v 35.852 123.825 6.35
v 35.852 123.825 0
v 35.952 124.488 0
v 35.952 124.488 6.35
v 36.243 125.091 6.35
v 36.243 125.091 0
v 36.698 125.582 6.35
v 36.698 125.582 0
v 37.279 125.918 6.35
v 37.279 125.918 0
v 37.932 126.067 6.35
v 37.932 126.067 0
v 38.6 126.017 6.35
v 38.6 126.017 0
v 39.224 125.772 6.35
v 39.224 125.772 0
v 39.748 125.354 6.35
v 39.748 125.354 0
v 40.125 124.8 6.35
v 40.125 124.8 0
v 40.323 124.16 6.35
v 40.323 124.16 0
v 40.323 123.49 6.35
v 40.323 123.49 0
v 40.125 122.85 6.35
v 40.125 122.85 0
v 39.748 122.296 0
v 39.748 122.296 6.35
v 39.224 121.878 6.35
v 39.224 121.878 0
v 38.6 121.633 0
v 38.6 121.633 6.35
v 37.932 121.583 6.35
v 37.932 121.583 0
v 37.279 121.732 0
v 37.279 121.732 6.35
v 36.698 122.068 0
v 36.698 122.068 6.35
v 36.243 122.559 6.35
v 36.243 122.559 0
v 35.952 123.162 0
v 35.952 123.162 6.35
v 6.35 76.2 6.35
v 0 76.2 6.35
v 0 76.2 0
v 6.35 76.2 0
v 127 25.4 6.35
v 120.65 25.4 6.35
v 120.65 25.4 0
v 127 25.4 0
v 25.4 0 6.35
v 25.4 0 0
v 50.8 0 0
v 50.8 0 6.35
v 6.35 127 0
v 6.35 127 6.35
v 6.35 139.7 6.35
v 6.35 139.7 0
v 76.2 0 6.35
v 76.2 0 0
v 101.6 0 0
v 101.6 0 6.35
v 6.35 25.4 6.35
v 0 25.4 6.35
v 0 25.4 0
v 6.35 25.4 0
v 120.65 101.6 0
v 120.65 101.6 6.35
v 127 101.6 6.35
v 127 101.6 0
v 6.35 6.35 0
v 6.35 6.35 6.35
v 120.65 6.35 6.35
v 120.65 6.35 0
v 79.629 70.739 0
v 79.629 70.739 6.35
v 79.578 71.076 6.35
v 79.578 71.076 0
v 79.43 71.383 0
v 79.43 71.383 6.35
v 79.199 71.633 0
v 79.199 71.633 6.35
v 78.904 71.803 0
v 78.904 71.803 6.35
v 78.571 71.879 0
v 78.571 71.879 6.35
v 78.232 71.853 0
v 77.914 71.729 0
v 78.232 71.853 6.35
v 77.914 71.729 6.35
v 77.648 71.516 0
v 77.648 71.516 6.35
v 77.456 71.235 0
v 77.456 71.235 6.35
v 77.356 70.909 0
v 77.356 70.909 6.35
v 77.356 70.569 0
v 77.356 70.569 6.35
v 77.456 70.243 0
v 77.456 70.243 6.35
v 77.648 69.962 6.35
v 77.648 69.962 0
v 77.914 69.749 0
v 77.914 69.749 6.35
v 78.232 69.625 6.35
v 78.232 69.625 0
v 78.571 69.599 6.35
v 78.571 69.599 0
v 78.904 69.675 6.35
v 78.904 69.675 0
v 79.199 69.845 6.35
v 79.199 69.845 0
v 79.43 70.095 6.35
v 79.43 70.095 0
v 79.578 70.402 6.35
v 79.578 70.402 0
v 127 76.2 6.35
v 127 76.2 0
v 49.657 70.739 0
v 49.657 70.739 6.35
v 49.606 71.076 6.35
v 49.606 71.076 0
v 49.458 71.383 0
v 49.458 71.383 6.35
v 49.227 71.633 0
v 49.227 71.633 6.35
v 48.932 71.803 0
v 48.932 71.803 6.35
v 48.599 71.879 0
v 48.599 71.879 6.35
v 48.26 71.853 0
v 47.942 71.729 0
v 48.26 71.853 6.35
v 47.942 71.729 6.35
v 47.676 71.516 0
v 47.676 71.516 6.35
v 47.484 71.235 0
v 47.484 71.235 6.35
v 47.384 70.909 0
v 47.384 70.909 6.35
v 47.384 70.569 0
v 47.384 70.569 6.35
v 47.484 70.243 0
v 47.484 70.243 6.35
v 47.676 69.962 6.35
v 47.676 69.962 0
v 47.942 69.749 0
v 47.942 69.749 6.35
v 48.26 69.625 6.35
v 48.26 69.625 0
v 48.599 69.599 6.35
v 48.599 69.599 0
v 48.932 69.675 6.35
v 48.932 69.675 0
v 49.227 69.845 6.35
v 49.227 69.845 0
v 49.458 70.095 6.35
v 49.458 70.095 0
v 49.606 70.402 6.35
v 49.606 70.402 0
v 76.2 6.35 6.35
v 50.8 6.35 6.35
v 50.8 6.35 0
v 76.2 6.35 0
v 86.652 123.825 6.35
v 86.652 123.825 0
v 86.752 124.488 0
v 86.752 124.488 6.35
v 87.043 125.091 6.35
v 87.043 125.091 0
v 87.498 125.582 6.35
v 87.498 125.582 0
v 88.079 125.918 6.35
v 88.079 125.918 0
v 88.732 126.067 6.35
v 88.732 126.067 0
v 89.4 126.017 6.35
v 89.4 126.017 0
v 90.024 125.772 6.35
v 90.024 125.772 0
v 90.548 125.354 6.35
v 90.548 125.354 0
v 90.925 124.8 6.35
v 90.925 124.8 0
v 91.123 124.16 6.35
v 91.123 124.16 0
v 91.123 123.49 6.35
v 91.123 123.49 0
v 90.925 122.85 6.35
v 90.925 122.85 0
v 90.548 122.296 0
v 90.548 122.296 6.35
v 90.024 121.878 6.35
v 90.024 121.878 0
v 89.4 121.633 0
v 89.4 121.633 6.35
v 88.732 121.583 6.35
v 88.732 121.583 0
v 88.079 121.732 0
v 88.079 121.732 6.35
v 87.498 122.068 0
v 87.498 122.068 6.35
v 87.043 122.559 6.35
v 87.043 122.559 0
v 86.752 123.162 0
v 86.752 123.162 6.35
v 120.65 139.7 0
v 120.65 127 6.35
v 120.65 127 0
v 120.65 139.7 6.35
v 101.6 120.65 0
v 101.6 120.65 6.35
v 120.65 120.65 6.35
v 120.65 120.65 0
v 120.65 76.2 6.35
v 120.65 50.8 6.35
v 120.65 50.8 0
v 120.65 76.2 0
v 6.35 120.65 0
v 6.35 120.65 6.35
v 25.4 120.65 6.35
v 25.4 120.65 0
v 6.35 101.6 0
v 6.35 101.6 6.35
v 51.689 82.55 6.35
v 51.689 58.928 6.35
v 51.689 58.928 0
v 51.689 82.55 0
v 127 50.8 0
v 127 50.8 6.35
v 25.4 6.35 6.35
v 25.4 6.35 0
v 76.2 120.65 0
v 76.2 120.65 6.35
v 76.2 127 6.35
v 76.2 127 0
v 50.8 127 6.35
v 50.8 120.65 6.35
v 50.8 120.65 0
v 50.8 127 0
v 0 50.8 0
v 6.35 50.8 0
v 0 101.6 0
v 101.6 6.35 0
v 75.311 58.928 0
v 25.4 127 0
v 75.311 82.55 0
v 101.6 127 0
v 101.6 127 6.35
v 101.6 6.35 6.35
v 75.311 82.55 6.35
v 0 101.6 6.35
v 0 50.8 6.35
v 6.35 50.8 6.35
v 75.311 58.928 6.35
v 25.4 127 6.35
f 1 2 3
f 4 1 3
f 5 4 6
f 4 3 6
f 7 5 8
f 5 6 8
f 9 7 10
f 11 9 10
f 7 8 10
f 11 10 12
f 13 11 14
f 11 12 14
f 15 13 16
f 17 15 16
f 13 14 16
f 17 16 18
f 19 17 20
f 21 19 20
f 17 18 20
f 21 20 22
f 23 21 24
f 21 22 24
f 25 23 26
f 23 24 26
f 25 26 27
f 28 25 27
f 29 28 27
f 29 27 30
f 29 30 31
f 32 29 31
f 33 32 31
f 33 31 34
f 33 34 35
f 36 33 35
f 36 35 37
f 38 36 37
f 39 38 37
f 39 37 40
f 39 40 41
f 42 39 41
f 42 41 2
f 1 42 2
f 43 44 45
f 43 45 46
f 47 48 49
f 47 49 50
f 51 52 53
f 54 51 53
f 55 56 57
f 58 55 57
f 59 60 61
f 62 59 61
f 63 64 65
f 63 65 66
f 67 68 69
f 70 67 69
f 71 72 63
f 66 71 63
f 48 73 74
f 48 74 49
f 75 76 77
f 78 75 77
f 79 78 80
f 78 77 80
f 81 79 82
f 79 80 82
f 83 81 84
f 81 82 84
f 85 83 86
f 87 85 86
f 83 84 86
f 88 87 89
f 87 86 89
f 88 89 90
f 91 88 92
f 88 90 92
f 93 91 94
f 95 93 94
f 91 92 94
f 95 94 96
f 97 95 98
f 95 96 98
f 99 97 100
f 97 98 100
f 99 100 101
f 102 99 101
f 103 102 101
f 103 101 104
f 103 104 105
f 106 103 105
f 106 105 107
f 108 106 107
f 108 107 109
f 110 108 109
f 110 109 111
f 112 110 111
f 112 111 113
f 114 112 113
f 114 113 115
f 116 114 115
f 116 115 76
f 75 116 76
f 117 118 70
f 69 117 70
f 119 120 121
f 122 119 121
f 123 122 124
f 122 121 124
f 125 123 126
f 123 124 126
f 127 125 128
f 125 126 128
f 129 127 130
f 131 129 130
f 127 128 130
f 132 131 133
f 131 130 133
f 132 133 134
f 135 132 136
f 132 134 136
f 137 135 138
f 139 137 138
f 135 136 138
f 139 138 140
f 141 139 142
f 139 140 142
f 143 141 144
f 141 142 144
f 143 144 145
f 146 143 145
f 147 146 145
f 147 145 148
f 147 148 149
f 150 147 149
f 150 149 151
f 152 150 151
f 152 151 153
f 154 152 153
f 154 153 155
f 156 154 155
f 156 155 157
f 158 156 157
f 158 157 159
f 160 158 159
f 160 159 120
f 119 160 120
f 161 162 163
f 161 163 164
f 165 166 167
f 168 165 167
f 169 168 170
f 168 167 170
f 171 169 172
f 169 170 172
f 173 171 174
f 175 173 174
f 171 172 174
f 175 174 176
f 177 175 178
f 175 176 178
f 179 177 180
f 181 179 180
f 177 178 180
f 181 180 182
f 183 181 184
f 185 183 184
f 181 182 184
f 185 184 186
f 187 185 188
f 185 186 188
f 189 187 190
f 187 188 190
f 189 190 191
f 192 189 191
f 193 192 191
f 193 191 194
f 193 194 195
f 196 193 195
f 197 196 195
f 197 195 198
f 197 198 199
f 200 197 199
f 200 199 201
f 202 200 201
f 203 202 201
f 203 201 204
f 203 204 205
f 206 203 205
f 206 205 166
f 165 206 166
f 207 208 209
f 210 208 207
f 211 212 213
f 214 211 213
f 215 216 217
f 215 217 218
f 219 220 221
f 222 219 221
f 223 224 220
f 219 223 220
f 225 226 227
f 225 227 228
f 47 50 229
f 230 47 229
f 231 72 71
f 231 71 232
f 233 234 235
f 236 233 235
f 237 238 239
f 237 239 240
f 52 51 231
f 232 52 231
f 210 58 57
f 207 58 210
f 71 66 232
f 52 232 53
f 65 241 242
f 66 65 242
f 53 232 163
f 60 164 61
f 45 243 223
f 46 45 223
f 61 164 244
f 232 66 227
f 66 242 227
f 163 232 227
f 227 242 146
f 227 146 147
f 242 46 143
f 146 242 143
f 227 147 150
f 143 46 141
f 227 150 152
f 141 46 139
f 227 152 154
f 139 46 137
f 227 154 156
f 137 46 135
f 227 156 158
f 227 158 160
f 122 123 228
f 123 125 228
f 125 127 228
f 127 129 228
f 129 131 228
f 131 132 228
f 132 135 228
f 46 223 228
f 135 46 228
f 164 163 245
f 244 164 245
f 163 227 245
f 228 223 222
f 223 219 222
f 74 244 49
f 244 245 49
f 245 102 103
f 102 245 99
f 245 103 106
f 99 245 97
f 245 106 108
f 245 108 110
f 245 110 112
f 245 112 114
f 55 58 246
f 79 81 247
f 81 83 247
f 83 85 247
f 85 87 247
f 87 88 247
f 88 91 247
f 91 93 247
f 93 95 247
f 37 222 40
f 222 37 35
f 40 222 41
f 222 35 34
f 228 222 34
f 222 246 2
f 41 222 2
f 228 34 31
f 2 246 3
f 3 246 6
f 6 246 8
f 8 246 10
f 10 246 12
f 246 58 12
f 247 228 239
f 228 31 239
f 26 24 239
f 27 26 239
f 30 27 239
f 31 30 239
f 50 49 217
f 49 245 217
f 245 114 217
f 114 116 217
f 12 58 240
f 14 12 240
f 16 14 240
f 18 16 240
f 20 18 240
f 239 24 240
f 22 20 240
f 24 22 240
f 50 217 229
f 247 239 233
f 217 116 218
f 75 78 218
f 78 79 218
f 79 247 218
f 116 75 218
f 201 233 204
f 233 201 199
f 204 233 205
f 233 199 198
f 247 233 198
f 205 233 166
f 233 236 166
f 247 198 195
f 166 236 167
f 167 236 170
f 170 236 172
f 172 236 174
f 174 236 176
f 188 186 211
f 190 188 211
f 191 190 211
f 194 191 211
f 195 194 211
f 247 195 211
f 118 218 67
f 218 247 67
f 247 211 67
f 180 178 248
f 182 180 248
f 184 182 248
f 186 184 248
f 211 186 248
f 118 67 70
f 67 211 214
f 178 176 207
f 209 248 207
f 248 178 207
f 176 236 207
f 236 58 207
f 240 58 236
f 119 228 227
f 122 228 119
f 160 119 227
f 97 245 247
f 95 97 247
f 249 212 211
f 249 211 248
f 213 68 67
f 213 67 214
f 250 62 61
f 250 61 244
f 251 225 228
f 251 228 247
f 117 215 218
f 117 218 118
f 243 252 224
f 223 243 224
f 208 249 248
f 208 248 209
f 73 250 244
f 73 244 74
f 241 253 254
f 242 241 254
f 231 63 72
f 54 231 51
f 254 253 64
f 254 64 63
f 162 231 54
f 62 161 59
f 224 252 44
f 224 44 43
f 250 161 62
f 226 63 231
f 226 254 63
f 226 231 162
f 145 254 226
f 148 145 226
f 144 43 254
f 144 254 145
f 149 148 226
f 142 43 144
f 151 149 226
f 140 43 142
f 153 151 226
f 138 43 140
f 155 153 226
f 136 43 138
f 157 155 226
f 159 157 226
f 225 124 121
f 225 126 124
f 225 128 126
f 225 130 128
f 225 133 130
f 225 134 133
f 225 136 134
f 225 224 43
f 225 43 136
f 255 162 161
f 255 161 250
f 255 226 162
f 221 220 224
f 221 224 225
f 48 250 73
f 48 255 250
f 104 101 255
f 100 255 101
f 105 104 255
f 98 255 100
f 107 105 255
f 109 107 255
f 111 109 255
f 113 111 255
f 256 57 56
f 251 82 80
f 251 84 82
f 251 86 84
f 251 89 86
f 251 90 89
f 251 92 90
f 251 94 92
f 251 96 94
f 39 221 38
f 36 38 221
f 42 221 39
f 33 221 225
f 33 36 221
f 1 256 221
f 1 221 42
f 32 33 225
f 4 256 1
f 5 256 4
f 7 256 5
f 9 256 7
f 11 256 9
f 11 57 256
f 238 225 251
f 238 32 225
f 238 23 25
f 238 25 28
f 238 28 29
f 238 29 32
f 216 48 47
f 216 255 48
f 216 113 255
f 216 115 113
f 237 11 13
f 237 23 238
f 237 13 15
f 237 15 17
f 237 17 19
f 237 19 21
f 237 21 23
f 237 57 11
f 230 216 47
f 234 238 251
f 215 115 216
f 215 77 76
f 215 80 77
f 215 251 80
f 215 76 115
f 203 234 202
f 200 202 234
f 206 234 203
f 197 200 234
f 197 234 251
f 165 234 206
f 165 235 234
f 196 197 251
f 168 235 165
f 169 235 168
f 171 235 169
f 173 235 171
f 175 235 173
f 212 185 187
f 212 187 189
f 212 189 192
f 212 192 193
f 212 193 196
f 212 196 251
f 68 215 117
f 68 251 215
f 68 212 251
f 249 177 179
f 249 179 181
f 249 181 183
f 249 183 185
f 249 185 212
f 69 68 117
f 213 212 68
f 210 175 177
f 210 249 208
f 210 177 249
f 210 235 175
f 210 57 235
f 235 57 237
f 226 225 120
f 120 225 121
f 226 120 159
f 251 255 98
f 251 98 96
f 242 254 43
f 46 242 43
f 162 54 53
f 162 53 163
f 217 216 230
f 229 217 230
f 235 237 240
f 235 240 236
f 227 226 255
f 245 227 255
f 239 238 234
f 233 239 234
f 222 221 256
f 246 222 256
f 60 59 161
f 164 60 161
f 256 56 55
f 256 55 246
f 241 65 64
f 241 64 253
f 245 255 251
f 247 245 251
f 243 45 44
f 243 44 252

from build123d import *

# Parameters (mm, degrees)
SKETCH1_W                 = 127
SKETCH1_H                 = 139.7
BOSS_EXTRUDE1_DEPTH       = 6.35
SKETCH5_W                 = 6.35
SKETCH5_H                 = 25.4
CUT_EXTRUDE4_DEPTH        = 6.35
SKETCH6_W                 = 25.4
SKETCH6_H                 = 6.35
CUT_EXTRUDE5_DEPTH        = 6.35
LPATTERN5_COUNT           = 3
LPATTERN5_PITCH           = 50.8
LPATTERN5_COUNT_DIR2      = 2
LPATTERN5_PITCH_DIR2      = 120.65
LPATTERN6_COUNT           = 3
LPATTERN6_PITCH           = 50.8
LPATTERN6_COUNT_DIR2      = 2
LPATTERN6_PITCH_DIR2      = 120.65
SKETCH7_W                 = 6.35
SKETCH7_H                 = 19.05
CUT_EXTRUDE6_DEPTH        = 6.35
SKETCH12_W                = 6.35
SKETCH12_H                = 12.7
CUT_EXTRUDE9_DEPTH        = 7.62
F_8_CLEARANCE_HOLE1_D     = 4.4958
F_8_CLEARANCE_HOLE1_DEPTH = 10.16
F_8_CLEARANCE_HOLE1_TIP   = 1.350674586
SKETCH11_R                = 1.143
SKETCH11_W                = 23.622
SKETCH11_H                = 23.622
CUT_EXTRUDE8_DEPTH        = 7.62


with BuildPart() as part:
    # Sketch1 → Boss-Extrude1 (new body)
    with BuildSketch(Plane.XY):
        with Locations((63.5, 69.85)):
            Rectangle(SKETCH1_W, SKETCH1_H)
    extrude(amount=BOSS_EXTRUDE1_DEPTH)

    # Sketch5 → Cut-Extrude4 (cut)
    with BuildSketch(Plane.XY.offset(6.35)):
        with Locations((3.175, 12.7)):
            Rectangle(SKETCH5_W, SKETCH5_H)
    cut_extrude4 = extrude(amount=-CUT_EXTRUDE4_DEPTH, mode=Mode.SUBTRACT)

    # Sketch6 → Cut-Extrude5 (cut)
    with BuildSketch(Plane.XY.offset(6.35)):
        with Locations((12.7, 3.175)):
            Rectangle(SKETCH6_W, SKETCH6_H)
    cut_extrude5 = extrude(amount=-CUT_EXTRUDE5_DEPTH, mode=Mode.SUBTRACT)

    # LPattern5: Cut-Extrude4 3 × 2
    with Locations(*[(j * LPATTERN5_PITCH_DIR2, i * LPATTERN5_PITCH, 0) for i in range(LPATTERN5_COUNT) for j in range(LPATTERN5_COUNT_DIR2) if (i, j) != (0, 0)]):
        add(cut_extrude4, mode=Mode.SUBTRACT)

    # LPattern6: Cut-Extrude5 3 × 2
    with Locations(*[(i * LPATTERN6_PITCH, j * LPATTERN6_PITCH_DIR2, 0) for i in range(LPATTERN6_COUNT) for j in range(LPATTERN6_COUNT_DIR2) if (i, j) != (0, 0)]):
        add(cut_extrude5, mode=Mode.SUBTRACT)

    # Sketch7 → Cut-Extrude6 (cut)
    with BuildSketch(Plane.XY.offset(6.35)):
        with Locations((3.175, 130.175)):
            Rectangle(SKETCH7_W, SKETCH7_H)
    extrude(amount=-CUT_EXTRUDE6_DEPTH, mode=Mode.SUBTRACT)

    # Sketch12 → Cut-Extrude9 (cut)
    with BuildSketch(Plane.XY.offset(6.35)):
        with Locations((123.825, 133.35)):
            Rectangle(SKETCH12_W, SKETCH12_H)
    extrude(amount=-CUT_EXTRUDE9_DEPTH, mode=Mode.SUBTRACT)

    # #8 Clearance Hole1
    with Locations(Plane.XY.offset(6.35)):
        with Locations((38.1, 123.825), (88.9, 123.825)):
            Hole(F_8_CLEARANCE_HOLE1_D / 2, depth=F_8_CLEARANCE_HOLE1_DEPTH)
            with Locations((0, 0, -(F_8_CLEARANCE_HOLE1_DEPTH + F_8_CLEARANCE_HOLE1_TIP / 2))):  # 118° drill point
                Cone(0, F_8_CLEARANCE_HOLE1_D / 2, F_8_CLEARANCE_HOLE1_TIP, mode=Mode.SUBTRACT)

    # Sketch11 → Cut-Extrude8 (cut)
    with BuildSketch(Plane.XY.offset(6.35)):
        with Locations((48.514, 70.739)):
            Circle(SKETCH11_R)
        with Locations((78.486, 70.739)):
            Circle(SKETCH11_R)
        with Locations((63.5, 70.739)):
            Rectangle(SKETCH11_W, SKETCH11_H)
    extrude(amount=-CUT_EXTRUDE8_DEPTH, mode=Mode.SUBTRACT)


solid = part.part
